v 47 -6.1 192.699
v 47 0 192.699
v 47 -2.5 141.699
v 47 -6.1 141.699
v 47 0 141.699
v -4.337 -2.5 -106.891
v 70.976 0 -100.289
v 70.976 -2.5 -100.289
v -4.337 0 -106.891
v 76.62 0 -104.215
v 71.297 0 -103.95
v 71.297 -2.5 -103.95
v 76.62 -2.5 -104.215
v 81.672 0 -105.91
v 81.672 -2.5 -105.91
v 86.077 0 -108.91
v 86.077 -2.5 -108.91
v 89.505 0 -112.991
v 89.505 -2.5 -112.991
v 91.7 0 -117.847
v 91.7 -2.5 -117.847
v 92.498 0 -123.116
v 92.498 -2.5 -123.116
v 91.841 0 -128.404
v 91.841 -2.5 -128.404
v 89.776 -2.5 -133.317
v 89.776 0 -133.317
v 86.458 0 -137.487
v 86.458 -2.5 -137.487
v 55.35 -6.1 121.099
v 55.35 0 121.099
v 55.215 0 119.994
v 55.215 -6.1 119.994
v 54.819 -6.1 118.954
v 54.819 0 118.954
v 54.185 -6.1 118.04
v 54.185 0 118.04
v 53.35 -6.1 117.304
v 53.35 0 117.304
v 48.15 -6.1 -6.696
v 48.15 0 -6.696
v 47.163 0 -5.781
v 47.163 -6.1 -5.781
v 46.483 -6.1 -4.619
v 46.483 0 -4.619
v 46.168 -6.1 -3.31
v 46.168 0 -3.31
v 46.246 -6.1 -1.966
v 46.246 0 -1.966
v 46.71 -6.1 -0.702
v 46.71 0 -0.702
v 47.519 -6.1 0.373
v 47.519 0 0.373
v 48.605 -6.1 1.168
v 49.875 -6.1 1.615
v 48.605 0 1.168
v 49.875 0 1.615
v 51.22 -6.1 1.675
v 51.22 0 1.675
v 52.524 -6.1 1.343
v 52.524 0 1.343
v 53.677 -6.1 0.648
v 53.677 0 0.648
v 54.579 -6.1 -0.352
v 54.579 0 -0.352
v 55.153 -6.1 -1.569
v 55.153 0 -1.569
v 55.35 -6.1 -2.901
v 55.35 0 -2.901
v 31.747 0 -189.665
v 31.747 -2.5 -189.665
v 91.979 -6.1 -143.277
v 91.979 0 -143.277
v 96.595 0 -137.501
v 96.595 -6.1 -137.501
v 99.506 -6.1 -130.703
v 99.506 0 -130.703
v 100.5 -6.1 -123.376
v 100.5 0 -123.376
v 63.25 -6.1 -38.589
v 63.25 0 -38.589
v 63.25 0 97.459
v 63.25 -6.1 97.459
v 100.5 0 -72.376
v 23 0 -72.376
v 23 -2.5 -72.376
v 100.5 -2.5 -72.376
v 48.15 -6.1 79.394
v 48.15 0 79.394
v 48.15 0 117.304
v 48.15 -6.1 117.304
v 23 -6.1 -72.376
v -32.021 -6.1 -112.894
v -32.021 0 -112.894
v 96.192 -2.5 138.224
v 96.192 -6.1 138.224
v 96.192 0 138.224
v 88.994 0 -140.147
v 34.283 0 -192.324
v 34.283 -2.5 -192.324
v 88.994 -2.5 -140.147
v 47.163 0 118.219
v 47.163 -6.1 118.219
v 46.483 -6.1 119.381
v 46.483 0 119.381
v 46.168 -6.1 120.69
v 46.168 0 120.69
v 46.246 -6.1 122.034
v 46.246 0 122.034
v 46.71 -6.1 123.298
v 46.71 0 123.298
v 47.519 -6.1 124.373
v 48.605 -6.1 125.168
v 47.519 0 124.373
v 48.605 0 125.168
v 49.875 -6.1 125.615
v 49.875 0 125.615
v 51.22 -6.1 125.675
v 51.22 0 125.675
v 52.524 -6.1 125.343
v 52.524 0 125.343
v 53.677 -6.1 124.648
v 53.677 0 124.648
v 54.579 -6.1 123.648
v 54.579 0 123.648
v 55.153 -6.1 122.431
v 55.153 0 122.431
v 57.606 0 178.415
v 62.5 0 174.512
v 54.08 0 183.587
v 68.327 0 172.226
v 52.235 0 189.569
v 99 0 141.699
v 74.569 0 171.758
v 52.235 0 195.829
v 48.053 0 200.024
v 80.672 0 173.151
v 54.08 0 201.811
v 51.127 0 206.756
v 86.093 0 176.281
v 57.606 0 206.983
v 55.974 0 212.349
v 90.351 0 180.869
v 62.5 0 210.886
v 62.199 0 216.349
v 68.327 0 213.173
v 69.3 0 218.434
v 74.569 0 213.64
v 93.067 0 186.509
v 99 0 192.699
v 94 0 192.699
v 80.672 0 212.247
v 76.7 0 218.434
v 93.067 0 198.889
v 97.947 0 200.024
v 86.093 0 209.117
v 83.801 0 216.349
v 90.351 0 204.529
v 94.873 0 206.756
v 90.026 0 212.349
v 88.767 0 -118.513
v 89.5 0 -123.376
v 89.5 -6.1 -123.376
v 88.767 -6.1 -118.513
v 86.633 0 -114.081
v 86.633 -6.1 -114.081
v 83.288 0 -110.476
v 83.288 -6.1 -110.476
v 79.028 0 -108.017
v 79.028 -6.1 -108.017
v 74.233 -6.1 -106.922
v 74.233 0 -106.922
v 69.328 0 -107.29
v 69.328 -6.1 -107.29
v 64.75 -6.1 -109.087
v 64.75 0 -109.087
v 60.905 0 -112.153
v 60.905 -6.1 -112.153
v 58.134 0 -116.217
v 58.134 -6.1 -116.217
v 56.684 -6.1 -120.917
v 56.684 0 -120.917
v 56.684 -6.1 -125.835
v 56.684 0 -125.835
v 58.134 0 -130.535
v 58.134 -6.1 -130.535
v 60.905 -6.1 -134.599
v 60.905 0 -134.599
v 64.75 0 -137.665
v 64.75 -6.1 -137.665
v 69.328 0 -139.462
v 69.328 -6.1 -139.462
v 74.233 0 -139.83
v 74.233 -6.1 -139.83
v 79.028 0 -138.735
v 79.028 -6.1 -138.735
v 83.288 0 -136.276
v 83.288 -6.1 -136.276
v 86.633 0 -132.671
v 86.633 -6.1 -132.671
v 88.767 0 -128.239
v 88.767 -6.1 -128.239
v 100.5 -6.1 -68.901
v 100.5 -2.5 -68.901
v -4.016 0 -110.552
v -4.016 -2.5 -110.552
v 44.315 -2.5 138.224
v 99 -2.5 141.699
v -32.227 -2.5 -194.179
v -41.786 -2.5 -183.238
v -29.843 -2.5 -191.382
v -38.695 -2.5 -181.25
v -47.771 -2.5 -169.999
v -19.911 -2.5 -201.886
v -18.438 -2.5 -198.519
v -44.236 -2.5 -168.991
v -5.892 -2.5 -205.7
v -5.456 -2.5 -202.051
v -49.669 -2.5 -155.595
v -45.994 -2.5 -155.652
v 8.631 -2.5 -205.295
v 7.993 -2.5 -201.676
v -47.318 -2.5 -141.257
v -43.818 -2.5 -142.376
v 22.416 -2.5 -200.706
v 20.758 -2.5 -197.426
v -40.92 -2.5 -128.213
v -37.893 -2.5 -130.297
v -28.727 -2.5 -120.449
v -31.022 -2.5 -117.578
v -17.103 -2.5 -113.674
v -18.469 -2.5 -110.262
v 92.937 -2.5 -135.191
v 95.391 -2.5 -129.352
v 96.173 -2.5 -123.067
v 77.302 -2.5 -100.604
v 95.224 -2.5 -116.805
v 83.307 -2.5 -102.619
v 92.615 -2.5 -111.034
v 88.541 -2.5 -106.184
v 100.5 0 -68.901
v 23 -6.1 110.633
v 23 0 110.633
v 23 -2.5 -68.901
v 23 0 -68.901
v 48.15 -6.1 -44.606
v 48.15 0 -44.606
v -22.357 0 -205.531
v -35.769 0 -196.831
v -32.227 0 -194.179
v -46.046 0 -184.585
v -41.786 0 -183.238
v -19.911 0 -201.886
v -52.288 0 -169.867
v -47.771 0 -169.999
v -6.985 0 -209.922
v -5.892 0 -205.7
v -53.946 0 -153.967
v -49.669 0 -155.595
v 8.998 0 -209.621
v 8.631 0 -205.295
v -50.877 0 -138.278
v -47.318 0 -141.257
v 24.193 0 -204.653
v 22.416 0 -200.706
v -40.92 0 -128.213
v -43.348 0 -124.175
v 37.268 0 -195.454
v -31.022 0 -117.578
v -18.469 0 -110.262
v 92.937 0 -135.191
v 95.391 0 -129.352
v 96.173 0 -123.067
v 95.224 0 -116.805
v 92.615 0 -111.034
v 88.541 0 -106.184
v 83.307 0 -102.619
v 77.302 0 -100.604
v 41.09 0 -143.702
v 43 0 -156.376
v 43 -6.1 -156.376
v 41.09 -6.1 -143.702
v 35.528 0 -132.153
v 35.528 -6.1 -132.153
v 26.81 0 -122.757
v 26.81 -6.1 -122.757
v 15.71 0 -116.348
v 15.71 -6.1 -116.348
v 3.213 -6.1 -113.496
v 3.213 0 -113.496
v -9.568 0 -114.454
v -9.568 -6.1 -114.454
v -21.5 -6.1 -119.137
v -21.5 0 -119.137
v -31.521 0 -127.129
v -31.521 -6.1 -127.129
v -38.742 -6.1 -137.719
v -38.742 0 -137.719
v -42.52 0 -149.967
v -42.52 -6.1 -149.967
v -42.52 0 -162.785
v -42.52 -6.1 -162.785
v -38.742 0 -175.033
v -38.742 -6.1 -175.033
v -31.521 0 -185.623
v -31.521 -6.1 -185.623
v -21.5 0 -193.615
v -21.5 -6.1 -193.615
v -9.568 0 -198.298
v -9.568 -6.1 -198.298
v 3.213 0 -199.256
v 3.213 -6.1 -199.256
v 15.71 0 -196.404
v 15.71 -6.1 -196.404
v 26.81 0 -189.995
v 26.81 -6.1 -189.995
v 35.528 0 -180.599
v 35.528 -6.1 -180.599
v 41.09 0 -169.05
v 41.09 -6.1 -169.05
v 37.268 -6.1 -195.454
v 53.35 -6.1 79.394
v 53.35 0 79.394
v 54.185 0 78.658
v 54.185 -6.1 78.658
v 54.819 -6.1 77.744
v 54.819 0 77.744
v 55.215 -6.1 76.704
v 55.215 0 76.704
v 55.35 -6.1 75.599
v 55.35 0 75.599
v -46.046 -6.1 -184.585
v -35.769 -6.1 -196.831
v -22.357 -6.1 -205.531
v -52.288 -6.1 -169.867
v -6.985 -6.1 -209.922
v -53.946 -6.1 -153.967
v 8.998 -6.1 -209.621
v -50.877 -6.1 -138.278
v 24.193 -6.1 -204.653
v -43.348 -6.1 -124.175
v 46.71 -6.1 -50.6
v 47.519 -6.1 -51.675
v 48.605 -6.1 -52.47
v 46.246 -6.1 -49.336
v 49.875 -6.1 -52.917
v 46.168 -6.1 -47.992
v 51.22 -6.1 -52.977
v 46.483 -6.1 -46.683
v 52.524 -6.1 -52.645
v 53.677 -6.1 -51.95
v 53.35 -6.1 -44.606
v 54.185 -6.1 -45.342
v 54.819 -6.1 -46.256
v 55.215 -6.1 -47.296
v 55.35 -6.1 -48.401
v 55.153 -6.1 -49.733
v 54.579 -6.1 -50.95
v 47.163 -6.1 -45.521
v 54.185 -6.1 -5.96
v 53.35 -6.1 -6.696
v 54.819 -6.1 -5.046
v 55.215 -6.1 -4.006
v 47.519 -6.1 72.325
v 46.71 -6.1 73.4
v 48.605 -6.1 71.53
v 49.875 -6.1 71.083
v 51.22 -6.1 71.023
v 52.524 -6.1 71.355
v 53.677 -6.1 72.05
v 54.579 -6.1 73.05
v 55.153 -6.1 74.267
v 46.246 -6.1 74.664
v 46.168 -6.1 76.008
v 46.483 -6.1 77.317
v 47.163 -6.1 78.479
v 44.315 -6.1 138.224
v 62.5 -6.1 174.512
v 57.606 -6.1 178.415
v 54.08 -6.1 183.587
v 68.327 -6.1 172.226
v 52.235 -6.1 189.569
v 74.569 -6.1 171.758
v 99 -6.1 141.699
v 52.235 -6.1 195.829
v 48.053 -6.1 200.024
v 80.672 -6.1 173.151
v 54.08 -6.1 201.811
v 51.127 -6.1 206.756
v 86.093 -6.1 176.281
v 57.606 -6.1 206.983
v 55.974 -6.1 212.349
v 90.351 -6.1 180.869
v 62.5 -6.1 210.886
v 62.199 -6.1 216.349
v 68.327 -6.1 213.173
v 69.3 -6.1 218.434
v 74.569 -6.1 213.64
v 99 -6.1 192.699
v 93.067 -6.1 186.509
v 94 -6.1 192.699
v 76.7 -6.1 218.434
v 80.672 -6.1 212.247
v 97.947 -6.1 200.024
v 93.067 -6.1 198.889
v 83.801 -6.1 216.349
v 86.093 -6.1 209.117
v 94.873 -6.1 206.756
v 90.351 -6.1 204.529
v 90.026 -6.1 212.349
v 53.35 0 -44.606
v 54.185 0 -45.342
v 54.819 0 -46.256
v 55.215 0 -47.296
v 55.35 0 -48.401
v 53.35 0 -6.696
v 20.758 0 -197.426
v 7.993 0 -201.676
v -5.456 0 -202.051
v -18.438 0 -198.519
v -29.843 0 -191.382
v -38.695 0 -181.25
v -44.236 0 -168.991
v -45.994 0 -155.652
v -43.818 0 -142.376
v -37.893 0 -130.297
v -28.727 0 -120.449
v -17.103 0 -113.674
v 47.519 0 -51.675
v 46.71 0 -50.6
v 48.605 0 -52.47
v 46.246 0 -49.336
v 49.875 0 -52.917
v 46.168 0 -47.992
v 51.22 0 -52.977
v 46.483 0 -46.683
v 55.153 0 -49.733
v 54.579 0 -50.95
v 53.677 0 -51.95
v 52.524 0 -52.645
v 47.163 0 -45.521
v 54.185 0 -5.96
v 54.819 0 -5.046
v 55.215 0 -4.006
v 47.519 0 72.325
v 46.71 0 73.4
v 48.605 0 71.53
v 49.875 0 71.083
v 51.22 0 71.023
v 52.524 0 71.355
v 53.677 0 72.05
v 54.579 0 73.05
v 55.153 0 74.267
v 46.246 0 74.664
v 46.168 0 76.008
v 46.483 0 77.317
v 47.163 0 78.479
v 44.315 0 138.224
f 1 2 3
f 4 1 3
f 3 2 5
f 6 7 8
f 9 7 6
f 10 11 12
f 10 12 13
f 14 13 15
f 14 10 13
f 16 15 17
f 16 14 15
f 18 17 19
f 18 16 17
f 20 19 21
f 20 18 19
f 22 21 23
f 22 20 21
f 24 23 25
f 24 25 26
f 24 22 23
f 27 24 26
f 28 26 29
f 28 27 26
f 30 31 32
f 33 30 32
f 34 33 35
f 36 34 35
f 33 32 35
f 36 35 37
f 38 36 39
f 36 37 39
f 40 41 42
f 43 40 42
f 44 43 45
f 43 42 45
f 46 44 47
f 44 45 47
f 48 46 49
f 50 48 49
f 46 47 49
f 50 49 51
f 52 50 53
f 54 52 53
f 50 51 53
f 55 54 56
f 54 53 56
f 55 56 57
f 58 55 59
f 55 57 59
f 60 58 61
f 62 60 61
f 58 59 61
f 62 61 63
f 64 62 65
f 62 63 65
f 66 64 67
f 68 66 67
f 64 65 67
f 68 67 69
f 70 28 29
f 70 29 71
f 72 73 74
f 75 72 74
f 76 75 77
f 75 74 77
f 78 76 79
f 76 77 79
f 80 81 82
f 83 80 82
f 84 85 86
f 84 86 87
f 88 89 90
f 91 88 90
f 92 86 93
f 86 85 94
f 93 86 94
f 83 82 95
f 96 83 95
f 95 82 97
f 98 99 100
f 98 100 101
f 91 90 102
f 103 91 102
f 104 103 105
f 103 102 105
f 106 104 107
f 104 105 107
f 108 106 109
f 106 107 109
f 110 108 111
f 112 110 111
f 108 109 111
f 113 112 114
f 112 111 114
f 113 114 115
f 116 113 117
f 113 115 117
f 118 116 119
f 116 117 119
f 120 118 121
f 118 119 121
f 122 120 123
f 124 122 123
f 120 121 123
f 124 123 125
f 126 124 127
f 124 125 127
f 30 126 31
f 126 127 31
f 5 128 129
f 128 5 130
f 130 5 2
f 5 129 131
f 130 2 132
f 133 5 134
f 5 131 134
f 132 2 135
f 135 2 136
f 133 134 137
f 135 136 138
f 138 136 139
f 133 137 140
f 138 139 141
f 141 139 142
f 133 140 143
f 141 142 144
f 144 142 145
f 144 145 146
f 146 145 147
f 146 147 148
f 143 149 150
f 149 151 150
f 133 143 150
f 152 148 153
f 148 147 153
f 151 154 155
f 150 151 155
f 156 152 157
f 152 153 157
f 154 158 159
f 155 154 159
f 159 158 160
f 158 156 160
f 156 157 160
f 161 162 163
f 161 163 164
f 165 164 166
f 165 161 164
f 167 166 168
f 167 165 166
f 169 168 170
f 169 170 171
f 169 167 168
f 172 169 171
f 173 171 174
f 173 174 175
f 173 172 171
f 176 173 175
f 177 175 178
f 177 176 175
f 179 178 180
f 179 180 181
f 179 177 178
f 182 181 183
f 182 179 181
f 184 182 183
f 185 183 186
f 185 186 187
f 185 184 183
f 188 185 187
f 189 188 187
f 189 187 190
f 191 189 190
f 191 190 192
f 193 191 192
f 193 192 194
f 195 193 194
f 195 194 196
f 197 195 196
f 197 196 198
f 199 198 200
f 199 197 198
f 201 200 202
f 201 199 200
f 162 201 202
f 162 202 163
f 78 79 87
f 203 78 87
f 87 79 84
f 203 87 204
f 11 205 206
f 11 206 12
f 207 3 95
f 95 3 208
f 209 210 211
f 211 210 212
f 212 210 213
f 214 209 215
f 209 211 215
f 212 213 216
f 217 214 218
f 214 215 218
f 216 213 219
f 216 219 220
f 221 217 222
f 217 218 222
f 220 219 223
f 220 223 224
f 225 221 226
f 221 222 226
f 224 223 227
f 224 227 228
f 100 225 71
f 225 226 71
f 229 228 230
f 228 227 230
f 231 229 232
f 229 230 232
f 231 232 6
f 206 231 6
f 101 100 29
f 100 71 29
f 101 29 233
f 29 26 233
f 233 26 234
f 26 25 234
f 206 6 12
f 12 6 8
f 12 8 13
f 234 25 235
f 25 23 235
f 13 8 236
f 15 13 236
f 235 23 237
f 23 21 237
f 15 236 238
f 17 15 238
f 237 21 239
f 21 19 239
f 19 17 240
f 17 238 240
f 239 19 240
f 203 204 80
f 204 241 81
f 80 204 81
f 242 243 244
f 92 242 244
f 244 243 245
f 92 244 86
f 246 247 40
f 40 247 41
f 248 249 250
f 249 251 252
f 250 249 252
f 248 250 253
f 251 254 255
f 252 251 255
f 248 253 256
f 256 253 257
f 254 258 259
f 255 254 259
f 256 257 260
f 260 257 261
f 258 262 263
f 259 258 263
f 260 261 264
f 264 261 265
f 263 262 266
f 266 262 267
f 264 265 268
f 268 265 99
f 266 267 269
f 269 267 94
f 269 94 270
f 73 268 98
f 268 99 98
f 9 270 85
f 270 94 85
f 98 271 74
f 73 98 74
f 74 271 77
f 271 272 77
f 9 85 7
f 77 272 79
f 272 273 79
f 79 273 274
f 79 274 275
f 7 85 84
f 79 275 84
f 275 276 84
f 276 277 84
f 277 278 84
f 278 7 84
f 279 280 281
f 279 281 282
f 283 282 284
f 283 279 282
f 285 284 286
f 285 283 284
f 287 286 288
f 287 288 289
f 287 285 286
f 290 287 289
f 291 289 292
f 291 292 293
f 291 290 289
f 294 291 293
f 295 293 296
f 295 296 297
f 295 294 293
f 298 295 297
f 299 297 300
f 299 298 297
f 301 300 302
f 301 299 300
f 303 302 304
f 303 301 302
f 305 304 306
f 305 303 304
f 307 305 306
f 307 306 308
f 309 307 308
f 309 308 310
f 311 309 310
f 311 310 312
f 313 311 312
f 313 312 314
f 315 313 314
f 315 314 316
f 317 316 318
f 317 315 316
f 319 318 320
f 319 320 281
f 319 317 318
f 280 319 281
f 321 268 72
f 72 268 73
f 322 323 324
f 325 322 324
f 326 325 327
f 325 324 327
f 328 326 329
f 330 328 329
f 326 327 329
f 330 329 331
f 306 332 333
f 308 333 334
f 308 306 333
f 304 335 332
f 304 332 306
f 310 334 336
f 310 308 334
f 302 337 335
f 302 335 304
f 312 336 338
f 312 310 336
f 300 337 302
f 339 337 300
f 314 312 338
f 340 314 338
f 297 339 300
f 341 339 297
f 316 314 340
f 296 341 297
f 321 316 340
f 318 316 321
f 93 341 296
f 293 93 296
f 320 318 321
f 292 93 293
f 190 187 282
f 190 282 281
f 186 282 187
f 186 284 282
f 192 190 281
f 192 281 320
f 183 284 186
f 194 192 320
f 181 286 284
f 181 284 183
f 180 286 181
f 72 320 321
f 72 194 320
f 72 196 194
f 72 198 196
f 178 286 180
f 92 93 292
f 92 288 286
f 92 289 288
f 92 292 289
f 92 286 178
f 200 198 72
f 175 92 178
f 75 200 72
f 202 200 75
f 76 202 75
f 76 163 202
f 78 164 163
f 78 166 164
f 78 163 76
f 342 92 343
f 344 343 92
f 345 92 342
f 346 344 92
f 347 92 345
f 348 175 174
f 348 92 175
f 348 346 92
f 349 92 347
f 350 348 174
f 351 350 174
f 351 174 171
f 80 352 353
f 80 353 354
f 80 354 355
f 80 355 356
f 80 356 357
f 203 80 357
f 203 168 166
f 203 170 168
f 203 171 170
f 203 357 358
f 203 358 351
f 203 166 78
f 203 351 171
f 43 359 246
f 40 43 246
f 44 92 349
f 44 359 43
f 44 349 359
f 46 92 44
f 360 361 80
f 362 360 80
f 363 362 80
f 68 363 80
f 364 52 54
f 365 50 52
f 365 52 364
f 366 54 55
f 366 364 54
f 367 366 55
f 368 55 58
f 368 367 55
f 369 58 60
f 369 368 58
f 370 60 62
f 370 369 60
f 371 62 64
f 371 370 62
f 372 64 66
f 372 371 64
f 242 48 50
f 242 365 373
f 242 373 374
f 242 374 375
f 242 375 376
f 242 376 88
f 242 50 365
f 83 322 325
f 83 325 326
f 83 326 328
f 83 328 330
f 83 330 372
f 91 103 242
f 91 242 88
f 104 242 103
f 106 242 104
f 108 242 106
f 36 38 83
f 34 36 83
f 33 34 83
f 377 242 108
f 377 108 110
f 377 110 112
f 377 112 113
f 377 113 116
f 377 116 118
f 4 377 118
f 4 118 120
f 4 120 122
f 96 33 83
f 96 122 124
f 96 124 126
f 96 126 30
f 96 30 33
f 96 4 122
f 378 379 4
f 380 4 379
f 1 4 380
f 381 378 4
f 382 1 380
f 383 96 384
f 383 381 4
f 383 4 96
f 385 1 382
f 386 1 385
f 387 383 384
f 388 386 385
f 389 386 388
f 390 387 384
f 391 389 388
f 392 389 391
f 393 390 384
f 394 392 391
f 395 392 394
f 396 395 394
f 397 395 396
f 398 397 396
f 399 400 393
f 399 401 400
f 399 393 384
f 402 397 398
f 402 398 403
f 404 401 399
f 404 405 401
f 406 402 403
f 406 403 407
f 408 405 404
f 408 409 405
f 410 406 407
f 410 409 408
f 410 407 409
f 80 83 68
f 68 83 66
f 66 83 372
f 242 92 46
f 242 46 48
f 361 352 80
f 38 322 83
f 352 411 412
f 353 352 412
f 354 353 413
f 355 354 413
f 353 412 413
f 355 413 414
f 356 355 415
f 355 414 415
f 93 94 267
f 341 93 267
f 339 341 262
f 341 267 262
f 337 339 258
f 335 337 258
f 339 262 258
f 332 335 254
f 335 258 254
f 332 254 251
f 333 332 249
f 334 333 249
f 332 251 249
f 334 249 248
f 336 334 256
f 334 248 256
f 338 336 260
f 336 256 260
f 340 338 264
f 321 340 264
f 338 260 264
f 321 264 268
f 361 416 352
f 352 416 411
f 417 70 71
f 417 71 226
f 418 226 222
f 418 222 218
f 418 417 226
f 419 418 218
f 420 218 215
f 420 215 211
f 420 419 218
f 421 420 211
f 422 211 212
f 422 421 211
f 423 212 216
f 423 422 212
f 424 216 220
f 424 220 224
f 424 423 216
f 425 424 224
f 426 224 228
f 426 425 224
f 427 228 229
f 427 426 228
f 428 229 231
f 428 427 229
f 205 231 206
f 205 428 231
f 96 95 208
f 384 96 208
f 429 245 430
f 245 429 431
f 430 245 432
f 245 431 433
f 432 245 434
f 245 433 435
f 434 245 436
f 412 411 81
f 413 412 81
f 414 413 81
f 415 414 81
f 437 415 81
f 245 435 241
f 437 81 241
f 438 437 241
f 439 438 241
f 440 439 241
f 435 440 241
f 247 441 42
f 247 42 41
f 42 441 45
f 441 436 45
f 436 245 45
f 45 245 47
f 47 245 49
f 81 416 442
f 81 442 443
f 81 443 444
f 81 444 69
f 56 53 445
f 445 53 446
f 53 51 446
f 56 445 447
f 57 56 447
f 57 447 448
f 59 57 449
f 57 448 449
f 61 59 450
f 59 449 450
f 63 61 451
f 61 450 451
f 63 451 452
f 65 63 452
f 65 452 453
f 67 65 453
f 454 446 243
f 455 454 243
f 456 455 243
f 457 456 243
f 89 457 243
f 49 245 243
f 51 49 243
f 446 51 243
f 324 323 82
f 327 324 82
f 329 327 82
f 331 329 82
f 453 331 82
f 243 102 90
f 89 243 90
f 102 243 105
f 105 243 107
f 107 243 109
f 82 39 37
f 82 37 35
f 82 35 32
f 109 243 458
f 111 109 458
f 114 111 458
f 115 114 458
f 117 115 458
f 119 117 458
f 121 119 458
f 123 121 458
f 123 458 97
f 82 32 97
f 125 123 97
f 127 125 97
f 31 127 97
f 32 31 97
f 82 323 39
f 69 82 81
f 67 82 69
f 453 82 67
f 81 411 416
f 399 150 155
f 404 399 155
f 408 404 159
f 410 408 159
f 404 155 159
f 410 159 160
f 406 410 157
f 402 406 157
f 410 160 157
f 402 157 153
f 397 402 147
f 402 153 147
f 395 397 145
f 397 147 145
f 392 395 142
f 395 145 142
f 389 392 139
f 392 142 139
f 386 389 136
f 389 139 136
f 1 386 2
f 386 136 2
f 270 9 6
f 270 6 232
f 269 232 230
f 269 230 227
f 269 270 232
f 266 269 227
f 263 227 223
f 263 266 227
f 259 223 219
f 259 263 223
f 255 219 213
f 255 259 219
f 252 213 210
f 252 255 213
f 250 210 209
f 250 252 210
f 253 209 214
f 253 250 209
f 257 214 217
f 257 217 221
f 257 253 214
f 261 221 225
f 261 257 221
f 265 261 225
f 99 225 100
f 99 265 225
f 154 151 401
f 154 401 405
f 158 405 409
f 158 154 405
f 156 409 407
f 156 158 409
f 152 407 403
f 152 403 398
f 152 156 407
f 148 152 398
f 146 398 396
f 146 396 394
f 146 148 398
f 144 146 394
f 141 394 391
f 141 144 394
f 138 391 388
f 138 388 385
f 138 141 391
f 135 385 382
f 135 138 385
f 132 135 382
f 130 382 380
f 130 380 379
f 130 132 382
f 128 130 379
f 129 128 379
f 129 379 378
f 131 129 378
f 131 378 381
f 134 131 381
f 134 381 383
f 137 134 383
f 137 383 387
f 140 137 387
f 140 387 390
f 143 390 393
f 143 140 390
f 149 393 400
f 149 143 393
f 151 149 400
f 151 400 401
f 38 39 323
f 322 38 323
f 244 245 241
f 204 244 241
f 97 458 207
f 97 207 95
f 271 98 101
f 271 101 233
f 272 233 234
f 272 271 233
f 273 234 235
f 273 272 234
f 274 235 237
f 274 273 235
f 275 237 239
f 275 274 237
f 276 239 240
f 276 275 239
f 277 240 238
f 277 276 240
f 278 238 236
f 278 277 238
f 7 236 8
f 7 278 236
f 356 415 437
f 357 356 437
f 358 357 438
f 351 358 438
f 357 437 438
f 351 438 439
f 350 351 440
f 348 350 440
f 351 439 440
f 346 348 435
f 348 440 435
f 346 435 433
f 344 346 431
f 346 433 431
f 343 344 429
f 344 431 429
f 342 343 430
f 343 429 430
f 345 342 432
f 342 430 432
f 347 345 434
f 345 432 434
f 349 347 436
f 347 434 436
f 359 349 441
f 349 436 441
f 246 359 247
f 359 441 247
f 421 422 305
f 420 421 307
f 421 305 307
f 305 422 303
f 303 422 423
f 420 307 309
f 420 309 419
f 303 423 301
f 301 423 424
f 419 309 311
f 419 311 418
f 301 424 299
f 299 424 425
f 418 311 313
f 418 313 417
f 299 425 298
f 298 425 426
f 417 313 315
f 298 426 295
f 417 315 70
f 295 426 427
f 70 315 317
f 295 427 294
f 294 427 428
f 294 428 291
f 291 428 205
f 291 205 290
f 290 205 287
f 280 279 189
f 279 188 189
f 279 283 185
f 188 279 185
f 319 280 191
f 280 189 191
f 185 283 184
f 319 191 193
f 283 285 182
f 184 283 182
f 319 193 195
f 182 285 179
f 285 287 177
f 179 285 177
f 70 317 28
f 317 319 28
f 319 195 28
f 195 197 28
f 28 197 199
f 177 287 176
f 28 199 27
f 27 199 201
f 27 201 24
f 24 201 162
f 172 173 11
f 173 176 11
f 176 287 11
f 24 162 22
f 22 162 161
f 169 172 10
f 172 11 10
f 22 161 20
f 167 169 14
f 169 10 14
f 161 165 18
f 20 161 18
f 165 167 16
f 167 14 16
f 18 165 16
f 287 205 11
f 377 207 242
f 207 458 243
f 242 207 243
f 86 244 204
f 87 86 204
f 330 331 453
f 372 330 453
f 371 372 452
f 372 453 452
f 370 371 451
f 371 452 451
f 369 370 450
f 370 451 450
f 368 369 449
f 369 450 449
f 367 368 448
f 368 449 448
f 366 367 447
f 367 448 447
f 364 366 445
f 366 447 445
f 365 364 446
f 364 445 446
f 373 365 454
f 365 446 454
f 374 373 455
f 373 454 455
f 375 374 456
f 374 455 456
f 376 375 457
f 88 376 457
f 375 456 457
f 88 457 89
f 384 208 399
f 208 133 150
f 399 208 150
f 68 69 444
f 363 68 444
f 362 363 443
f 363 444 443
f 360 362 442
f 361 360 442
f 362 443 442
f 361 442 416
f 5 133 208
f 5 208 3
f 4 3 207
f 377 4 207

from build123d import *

# Parameters (mm, degrees)
F1_W     = 77.5
F1_H     = 3.475
F1_R     = 21
F1_R_2   = 43
F1_R_3   = 16.5
F2_DEPTH = 6.1
F3_DEPTH = 2.5


with BuildPart() as f2:
    # F1 (on Front) → F2 (new body)
    with BuildSketch(Plane.XZ):
        Polygon((100.5, -68.9009734364), (63.25, -38.5886058211), (63.25, 97.4589511752), (96.191884306, 138.2240265636), (44.3153656491, 138.2240265636), (23, 110.6333434582), (23, -68.9009734364), align=None)
        with BuildLine():
            Line((53.35, -27.8899289966), (53.35, -44.6062402442))
            ThreePointArc((53.35, -44.6062402442), (54.8193979899, -46.2562123774), (55.35, -48.4009734364))
            ThreePointArc((55.35, -48.4009734364), (48.605238941, -52.4703714262), (48.15, -44.6062402442))
            Line((48.15, -44.6062402442), (48.15, -27.8899289966))
            Line((48.15, -27.8899289966), (48.15, -25.6509734364))
            Line((48.15, -25.6509734364), (48.15, -23.4120178762))
            Line((48.15, -23.4120178762), (48.15, -6.6957066286))
            ThreePointArc((48.15, -6.6957066286), (48.605238941, 1.1684245535), (55.35, -2.9009734364))
            ThreePointArc((55.35, -2.9009734364), (54.8193979899, -5.0457344953), (53.35, -6.6957066286))
            Line((53.35, -6.6957066286), (53.35, -23.4120178762))
            Line((53.35, -23.4120178762), (53.35, -25.6509734364))
            Line((53.35, -25.6509734364), (53.35, -27.8899289966))
        make_face(mode=Mode.SUBTRACT)
        with BuildLine():
            Line((53.35, 98.1746025085), (53.35, 79.3937597558))
            ThreePointArc((53.35, 79.3937597558), (54.8193979899, 77.7437876226), (55.35, 75.5990265636))
            ThreePointArc((55.35, 75.5990265636), (48.605238941, 71.5296285738), (48.15, 79.3937597558))
            Line((48.15, 79.3937597558), (48.15, 98.1746025085))
            Line((48.15, 98.1746025085), (48.15, 98.3490265636))
            Line((48.15, 98.3490265636), (48.15, 98.5234506187))
            Line((48.15, 98.5234506187), (48.15, 117.3042933714))
            ThreePointArc((48.15, 117.3042933714), (48.605238941, 125.1684245535), (55.35, 121.0990265636))
            ThreePointArc((55.35, 121.0990265636), (54.8193979899, 118.9542655047), (53.35, 117.3042933714))
            Line((53.35, 117.3042933714), (53.35, 98.5234506187))
            Line((53.35, 98.5234506187), (53.35, 98.3490265636))
            Line((53.35, 98.3490265636), (53.35, 98.1746025085))
        make_face(mode=Mode.SUBTRACT)
        with Locations((61.75, -70.6384734364)):
            Rectangle(F1_W, F1_H)
        Polygon((44.3153656491, 138.2240265636), (96.191884306, 138.2240265636), (99, 141.6990265636), (47, 141.6990265636), align=None)
        with BuildLine():
            Line((100.5, -123.3759734364), (100.5, -72.3759734364))
            Line((100.5, -72.3759734364), (23, -72.3759734364))
            Line((23, -72.3759734364), (-32.0207315003, -112.894106478))
            ThreePointArc((-32.0207315003, -112.894106478), (-41.3632102296, -191.0903053398), (37.2681203413, -195.4539366155))
            Line((37.2681203413, -195.4539366155), (91.979135359, -143.2767880183))
            ThreePointArc((91.979135359, -143.2767880183), (98.2801920718, -134.200107989), (100.5, -123.3759734364))
        make_face()
        with BuildLine():
            ThreePointArc((34.2832199621, -192.3240812312), (-45.2648285285, -176.8381561958), (-4.3373528695, -106.8906928462))
            Line((-4.3373528695, -106.8906928462), (70.9764840916, -100.2894836995))
            ThreePointArc((70.9764840916, -100.2894836995), (94.11751185, -113.8297009562), (88.9942349798, -140.1469326341))
            Line((88.9942349798, -140.1469326341), (34.2832199621, -192.3240812312))
        make_face(mode=Mode.SUBTRACT)
        with BuildLine():
            Line((47, 141.6990265636), (99, 141.6990265636))
            Line((99, 141.6990265636), (99, 192.6990265636))
            ThreePointArc((99, 192.6990265636), (73, 218.6990265636), (47, 192.6990265636))
            Line((47, 192.6990265636), (47, 141.6990265636))
        make_face()
        with Locations((73, 192.6990265636)):
            Circle(F1_R, mode=Mode.SUBTRACT)
        with BuildLine():
            Line((70.9764840916, -100.2894836995), (-4.3373528695, -106.8906928462))
            ThreePointArc((-4.3373528695, -106.8906928462), (-45.2648285285, -176.8381561958), (34.2832199621, -192.3240812312))
            Line((34.2832199621, -192.3240812312), (88.9942349798, -140.1469326341))
            ThreePointArc((88.9942349798, -140.1469326341), (94.11751185, -113.8297009562), (70.9764840916, -100.2894836995))
        make_face()
        with BuildLine():
            Line((-4.016471706, -110.5516572381), (71.297365255, -103.9504480915))
            ThreePointArc((71.297365255, -103.9504480915), (90.7687801974, -115.3435111553), (86.4579323455, -137.4874601399))
            Line((86.4579323455, -137.4874601399), (31.7469173277, -189.6646087371))
            ThreePointArc((31.7469173277, -189.6646087371), (-41.9160968759, -175.3243459967), (-4.016471706, -110.5516572381))
        make_face(mode=Mode.SUBTRACT)
        with BuildLine():
            ThreePointArc((86.4579323455, -137.4874601399), (90.7687801974, -115.3435111553), (71.297365255, -103.9504480915))
            Line((71.297365255, -103.9504480915), (-4.016471706, -110.5516572381))
            ThreePointArc((-4.016471706, -110.5516572381), (-41.9160968759, -175.3243459967), (31.7469173277, -189.6646087371))
            Line((31.7469173277, -189.6646087371), (86.4579323455, -137.4874601399))
        make_face()
        with Locations((0, -156.3759734364)):
            Circle(F1_R_2, mode=Mode.SUBTRACT)
        with Locations((73, -123.3759734364)):
            Circle(F1_R_3, mode=Mode.SUBTRACT)
    extrude(amount=F2_DEPTH)

    # F1 (on Front) → F3 (cut)
    with BuildSketch(Plane.XZ):
        Polygon((44.3153656491, 138.2240265636), (96.191884306, 138.2240265636), (99, 141.6990265636), (47, 141.6990265636), align=None)
        with Locations((61.75, -70.6384734364)):
            Rectangle(F1_W, F1_H)
        with BuildLine():
            Line((70.9764840916, -100.2894836995), (-4.3373528695, -106.8906928462))
            ThreePointArc((-4.3373528695, -106.8906928462), (-45.2648285285, -176.8381561958), (34.2832199621, -192.3240812312))
            Line((34.2832199621, -192.3240812312), (88.9942349798, -140.1469326341))
            ThreePointArc((88.9942349798, -140.1469326341), (94.11751185, -113.8297009562), (70.9764840916, -100.2894836995))
        make_face()
        with BuildLine():
            Line((-4.016471706, -110.5516572381), (71.297365255, -103.9504480915))
            ThreePointArc((71.297365255, -103.9504480915), (90.7687801974, -115.3435111553), (86.4579323455, -137.4874601399))
            Line((86.4579323455, -137.4874601399), (31.7469173277, -189.6646087371))
            ThreePointArc((31.7469173277, -189.6646087371), (-41.9160968759, -175.3243459967), (-4.016471706, -110.5516572381))
        make_face(mode=Mode.SUBTRACT)
    extrude(amount=F3_DEPTH, mode=Mode.SUBTRACT)


solid = f2.part
